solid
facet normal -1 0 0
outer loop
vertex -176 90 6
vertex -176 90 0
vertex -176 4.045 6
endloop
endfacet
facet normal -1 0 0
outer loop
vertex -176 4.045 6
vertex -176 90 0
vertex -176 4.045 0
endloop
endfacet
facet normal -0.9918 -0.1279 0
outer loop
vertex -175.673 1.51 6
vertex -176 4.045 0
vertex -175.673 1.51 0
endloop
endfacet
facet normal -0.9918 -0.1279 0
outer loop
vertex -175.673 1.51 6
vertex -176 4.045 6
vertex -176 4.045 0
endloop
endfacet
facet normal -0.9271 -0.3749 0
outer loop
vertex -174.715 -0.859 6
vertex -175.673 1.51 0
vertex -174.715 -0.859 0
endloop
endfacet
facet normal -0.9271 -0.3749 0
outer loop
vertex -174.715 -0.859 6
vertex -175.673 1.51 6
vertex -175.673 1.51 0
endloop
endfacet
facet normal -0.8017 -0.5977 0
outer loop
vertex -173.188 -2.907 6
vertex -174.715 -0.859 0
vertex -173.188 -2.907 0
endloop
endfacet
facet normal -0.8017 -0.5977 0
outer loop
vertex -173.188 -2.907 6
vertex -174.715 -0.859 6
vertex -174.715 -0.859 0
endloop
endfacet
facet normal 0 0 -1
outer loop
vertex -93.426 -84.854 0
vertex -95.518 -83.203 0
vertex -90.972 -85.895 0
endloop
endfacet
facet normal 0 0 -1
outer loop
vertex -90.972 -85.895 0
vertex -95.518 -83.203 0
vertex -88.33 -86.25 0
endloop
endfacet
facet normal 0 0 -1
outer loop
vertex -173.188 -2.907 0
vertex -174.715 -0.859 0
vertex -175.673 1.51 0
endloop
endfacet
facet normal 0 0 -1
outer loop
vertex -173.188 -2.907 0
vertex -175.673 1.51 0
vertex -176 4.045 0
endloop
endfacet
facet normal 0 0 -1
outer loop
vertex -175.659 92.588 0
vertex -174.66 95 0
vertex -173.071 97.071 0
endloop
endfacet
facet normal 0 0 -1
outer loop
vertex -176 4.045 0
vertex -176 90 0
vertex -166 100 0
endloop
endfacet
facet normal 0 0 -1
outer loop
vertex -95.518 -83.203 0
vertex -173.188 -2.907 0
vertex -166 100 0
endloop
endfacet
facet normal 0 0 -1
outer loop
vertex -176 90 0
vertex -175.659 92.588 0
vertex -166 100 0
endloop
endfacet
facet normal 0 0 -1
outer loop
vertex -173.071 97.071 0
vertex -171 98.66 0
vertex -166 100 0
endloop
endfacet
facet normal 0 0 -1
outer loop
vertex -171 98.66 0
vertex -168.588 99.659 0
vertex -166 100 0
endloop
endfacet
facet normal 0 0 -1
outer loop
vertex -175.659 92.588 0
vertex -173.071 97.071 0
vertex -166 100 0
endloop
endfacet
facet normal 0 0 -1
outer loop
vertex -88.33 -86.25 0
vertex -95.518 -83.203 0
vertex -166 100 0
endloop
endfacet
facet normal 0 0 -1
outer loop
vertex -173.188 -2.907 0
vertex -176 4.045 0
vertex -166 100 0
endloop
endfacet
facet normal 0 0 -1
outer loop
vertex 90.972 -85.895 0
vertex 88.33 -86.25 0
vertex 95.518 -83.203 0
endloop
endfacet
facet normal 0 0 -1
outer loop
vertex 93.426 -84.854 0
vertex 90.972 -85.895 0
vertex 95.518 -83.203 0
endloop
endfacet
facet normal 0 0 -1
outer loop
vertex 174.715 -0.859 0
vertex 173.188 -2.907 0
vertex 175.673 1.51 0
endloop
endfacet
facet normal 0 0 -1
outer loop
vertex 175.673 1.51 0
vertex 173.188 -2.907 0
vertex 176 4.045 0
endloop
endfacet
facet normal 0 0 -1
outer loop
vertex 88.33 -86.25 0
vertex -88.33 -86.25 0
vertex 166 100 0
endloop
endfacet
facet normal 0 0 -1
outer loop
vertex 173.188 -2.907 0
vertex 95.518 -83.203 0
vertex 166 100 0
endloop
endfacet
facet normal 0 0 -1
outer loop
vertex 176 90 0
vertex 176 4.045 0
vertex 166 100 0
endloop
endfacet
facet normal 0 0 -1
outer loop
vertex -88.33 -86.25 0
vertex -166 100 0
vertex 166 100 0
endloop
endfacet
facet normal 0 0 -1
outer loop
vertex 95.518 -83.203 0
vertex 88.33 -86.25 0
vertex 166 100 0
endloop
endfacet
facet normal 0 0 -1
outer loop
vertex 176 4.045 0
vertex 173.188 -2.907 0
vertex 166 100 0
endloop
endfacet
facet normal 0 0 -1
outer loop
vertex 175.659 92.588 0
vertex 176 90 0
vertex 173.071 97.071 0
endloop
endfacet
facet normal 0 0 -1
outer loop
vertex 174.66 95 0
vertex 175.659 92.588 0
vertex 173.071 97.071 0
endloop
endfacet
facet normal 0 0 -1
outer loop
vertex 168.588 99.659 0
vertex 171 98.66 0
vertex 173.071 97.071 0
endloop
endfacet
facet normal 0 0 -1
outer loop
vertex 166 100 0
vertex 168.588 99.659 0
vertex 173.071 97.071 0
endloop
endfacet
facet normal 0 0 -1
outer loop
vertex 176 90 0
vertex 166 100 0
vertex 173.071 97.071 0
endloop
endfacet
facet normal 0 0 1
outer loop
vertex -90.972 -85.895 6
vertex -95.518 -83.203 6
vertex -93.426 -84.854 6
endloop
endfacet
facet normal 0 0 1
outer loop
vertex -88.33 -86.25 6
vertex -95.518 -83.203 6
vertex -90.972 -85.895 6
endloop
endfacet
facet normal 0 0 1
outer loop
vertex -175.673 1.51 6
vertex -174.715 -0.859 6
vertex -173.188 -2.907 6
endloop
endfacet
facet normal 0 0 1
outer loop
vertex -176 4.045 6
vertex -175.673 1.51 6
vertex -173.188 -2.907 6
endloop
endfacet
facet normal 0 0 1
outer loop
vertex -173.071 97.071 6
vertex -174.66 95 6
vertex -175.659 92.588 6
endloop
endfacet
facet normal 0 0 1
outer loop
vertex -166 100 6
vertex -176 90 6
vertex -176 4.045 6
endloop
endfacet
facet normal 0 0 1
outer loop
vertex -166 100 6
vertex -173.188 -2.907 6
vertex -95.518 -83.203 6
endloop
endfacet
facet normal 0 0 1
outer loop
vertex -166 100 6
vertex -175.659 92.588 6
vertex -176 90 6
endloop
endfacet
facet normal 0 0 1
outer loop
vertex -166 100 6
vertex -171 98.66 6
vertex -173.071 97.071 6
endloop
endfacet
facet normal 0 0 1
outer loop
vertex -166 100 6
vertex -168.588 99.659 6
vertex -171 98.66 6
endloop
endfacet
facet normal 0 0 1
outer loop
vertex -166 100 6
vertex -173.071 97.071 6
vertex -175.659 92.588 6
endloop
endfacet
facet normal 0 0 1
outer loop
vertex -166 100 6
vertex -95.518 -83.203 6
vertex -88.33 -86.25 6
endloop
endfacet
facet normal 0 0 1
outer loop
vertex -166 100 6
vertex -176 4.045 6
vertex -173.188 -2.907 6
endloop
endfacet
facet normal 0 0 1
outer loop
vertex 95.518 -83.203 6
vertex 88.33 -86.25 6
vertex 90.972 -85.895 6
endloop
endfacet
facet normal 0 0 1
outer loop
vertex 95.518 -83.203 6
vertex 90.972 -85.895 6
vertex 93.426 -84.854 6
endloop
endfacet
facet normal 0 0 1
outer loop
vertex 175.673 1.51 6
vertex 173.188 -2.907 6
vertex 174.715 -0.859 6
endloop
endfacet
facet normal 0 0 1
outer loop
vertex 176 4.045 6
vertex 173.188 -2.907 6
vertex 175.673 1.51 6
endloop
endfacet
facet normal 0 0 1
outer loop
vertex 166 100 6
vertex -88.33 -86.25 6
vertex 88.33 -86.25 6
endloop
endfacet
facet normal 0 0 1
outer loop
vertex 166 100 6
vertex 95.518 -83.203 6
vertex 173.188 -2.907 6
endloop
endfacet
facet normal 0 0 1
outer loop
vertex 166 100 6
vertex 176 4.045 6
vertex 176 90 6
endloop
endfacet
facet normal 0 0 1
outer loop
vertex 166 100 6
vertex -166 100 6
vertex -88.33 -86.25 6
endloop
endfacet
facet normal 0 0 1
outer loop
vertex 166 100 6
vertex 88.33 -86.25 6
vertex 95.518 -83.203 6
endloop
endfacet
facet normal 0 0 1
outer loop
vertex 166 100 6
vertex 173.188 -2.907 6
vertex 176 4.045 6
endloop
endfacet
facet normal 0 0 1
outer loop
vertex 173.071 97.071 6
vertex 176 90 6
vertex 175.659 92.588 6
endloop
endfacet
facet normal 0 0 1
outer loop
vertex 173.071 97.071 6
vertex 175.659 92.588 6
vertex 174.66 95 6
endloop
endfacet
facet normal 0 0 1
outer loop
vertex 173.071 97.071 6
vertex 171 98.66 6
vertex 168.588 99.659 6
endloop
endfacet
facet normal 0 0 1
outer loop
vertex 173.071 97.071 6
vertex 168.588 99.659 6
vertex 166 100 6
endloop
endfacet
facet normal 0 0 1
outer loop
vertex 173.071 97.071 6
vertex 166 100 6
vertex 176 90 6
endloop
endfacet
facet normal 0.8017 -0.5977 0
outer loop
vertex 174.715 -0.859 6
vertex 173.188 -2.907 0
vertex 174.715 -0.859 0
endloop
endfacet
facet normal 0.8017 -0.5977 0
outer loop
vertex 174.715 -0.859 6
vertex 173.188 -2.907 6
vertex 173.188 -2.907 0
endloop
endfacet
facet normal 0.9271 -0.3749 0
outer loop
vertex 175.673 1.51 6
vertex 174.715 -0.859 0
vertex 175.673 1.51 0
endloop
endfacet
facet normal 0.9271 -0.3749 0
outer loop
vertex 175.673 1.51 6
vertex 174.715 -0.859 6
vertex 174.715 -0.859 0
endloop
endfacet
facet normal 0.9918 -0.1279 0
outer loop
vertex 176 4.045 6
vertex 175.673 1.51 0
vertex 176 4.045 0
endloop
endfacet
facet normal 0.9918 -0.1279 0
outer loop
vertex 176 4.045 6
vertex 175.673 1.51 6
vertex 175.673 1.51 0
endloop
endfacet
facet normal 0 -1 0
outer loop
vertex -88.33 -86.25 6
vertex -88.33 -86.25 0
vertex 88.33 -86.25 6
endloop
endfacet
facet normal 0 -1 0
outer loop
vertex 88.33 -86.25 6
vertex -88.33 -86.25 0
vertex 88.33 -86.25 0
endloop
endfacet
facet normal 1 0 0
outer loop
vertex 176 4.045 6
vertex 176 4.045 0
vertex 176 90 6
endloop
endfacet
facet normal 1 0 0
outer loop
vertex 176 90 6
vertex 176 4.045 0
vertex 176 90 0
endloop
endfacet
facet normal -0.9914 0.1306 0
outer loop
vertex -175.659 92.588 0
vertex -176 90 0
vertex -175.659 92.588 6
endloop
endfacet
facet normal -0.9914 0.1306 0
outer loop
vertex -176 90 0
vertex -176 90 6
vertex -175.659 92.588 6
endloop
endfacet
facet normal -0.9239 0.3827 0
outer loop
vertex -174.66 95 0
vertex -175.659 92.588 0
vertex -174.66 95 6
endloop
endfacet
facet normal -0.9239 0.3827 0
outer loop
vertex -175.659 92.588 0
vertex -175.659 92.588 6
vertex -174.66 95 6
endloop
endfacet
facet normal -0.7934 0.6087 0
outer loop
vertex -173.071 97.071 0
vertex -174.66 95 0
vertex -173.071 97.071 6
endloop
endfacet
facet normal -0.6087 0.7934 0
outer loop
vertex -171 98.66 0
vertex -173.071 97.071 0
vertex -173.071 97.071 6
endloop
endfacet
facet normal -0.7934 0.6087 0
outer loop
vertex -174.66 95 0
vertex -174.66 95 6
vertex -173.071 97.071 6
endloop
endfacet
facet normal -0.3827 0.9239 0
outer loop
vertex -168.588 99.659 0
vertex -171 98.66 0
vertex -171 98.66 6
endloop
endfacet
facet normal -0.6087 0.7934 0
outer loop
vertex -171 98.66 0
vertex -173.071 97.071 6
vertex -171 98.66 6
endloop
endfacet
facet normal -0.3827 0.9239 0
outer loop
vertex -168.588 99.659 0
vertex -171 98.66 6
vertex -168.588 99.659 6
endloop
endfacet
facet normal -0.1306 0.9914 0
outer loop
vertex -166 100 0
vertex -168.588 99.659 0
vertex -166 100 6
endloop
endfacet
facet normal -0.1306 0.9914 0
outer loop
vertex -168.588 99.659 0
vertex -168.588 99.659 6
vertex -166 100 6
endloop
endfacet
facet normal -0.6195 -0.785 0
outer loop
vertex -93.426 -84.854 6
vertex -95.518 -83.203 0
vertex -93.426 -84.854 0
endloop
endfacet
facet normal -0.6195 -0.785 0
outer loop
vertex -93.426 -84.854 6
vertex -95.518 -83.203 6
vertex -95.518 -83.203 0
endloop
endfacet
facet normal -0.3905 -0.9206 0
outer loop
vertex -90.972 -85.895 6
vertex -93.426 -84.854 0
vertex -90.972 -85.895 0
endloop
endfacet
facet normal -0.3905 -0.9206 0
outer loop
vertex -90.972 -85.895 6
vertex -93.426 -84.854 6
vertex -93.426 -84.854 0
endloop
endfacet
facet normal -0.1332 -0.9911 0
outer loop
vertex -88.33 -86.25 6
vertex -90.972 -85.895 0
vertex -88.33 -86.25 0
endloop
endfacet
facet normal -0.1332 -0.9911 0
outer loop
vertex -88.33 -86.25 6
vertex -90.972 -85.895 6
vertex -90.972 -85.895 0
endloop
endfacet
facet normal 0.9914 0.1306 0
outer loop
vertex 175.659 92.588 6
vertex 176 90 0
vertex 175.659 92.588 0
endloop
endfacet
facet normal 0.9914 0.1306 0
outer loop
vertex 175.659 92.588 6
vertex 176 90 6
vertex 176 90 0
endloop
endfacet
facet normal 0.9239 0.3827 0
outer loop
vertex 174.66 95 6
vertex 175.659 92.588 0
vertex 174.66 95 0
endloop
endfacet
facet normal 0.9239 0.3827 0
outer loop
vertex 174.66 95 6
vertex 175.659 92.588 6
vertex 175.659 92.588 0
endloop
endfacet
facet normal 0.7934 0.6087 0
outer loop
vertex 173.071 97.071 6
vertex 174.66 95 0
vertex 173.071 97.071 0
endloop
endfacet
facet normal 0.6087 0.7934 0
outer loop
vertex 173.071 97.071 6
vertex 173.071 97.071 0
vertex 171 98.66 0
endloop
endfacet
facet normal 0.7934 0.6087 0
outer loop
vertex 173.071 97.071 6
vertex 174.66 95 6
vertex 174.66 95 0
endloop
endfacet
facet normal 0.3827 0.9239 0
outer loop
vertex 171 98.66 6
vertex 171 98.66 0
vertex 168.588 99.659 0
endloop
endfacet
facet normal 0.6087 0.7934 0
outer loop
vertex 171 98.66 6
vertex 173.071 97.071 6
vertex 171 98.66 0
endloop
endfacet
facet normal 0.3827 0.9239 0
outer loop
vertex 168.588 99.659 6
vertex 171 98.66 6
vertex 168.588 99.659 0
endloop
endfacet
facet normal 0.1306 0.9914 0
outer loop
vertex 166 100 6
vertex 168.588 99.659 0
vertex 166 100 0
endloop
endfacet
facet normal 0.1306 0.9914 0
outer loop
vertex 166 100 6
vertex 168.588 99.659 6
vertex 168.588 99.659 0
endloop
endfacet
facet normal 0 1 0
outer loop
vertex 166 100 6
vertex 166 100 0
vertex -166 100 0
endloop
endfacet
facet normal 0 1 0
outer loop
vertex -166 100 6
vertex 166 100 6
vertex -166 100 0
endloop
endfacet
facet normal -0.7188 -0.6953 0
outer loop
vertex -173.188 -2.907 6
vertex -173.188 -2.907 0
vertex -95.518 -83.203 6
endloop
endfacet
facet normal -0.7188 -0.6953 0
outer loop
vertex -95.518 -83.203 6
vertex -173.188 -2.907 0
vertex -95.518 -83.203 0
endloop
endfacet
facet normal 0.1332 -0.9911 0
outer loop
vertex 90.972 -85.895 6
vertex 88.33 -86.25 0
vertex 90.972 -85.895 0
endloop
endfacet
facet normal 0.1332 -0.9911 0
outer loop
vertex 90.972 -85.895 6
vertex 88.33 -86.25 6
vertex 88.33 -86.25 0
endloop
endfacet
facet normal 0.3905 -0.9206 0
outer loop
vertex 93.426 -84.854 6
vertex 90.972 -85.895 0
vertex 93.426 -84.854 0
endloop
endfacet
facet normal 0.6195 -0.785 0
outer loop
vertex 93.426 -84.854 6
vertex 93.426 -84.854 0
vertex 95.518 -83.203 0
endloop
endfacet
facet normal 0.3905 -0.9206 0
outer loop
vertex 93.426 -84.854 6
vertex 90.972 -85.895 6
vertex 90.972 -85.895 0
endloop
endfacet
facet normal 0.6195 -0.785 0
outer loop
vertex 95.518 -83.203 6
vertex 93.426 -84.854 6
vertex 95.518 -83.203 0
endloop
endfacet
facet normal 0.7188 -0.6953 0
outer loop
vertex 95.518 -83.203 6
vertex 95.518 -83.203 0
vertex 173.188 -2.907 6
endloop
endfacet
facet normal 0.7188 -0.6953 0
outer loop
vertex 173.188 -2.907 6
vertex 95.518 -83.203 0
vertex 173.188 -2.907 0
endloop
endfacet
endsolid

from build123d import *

# Parameters (mm, degrees)
BOSS_EXTRU_1_DEPTH = 6
CONG_1_R           = 10


with BuildPart() as part:
    # Esquisse1 → Boss.-Extru.1 (new body)
    with BuildSketch(Plane.XY):
        Polygon((-176, 100), (-176, 0), (-92.57, -86.25), (92.57, -86.25), (176, 0), (176, 100), align=None)
    extrude(amount=BOSS_EXTRU_1_DEPTH)

    # Congé1
    cong_1_edges = [part.edges().sort_by_distance(p)[0] for p in [
        (176, 100, 3),
        (176, 0, 3),
        (92.57, -86.25, 3),
        (-92.57, -86.25, 3),
        (-176, 0, 3),
        (-176, 100, 3),
    ]]
    fillet(cong_1_edges, radius=CONG_1_R)


solid = part.part
